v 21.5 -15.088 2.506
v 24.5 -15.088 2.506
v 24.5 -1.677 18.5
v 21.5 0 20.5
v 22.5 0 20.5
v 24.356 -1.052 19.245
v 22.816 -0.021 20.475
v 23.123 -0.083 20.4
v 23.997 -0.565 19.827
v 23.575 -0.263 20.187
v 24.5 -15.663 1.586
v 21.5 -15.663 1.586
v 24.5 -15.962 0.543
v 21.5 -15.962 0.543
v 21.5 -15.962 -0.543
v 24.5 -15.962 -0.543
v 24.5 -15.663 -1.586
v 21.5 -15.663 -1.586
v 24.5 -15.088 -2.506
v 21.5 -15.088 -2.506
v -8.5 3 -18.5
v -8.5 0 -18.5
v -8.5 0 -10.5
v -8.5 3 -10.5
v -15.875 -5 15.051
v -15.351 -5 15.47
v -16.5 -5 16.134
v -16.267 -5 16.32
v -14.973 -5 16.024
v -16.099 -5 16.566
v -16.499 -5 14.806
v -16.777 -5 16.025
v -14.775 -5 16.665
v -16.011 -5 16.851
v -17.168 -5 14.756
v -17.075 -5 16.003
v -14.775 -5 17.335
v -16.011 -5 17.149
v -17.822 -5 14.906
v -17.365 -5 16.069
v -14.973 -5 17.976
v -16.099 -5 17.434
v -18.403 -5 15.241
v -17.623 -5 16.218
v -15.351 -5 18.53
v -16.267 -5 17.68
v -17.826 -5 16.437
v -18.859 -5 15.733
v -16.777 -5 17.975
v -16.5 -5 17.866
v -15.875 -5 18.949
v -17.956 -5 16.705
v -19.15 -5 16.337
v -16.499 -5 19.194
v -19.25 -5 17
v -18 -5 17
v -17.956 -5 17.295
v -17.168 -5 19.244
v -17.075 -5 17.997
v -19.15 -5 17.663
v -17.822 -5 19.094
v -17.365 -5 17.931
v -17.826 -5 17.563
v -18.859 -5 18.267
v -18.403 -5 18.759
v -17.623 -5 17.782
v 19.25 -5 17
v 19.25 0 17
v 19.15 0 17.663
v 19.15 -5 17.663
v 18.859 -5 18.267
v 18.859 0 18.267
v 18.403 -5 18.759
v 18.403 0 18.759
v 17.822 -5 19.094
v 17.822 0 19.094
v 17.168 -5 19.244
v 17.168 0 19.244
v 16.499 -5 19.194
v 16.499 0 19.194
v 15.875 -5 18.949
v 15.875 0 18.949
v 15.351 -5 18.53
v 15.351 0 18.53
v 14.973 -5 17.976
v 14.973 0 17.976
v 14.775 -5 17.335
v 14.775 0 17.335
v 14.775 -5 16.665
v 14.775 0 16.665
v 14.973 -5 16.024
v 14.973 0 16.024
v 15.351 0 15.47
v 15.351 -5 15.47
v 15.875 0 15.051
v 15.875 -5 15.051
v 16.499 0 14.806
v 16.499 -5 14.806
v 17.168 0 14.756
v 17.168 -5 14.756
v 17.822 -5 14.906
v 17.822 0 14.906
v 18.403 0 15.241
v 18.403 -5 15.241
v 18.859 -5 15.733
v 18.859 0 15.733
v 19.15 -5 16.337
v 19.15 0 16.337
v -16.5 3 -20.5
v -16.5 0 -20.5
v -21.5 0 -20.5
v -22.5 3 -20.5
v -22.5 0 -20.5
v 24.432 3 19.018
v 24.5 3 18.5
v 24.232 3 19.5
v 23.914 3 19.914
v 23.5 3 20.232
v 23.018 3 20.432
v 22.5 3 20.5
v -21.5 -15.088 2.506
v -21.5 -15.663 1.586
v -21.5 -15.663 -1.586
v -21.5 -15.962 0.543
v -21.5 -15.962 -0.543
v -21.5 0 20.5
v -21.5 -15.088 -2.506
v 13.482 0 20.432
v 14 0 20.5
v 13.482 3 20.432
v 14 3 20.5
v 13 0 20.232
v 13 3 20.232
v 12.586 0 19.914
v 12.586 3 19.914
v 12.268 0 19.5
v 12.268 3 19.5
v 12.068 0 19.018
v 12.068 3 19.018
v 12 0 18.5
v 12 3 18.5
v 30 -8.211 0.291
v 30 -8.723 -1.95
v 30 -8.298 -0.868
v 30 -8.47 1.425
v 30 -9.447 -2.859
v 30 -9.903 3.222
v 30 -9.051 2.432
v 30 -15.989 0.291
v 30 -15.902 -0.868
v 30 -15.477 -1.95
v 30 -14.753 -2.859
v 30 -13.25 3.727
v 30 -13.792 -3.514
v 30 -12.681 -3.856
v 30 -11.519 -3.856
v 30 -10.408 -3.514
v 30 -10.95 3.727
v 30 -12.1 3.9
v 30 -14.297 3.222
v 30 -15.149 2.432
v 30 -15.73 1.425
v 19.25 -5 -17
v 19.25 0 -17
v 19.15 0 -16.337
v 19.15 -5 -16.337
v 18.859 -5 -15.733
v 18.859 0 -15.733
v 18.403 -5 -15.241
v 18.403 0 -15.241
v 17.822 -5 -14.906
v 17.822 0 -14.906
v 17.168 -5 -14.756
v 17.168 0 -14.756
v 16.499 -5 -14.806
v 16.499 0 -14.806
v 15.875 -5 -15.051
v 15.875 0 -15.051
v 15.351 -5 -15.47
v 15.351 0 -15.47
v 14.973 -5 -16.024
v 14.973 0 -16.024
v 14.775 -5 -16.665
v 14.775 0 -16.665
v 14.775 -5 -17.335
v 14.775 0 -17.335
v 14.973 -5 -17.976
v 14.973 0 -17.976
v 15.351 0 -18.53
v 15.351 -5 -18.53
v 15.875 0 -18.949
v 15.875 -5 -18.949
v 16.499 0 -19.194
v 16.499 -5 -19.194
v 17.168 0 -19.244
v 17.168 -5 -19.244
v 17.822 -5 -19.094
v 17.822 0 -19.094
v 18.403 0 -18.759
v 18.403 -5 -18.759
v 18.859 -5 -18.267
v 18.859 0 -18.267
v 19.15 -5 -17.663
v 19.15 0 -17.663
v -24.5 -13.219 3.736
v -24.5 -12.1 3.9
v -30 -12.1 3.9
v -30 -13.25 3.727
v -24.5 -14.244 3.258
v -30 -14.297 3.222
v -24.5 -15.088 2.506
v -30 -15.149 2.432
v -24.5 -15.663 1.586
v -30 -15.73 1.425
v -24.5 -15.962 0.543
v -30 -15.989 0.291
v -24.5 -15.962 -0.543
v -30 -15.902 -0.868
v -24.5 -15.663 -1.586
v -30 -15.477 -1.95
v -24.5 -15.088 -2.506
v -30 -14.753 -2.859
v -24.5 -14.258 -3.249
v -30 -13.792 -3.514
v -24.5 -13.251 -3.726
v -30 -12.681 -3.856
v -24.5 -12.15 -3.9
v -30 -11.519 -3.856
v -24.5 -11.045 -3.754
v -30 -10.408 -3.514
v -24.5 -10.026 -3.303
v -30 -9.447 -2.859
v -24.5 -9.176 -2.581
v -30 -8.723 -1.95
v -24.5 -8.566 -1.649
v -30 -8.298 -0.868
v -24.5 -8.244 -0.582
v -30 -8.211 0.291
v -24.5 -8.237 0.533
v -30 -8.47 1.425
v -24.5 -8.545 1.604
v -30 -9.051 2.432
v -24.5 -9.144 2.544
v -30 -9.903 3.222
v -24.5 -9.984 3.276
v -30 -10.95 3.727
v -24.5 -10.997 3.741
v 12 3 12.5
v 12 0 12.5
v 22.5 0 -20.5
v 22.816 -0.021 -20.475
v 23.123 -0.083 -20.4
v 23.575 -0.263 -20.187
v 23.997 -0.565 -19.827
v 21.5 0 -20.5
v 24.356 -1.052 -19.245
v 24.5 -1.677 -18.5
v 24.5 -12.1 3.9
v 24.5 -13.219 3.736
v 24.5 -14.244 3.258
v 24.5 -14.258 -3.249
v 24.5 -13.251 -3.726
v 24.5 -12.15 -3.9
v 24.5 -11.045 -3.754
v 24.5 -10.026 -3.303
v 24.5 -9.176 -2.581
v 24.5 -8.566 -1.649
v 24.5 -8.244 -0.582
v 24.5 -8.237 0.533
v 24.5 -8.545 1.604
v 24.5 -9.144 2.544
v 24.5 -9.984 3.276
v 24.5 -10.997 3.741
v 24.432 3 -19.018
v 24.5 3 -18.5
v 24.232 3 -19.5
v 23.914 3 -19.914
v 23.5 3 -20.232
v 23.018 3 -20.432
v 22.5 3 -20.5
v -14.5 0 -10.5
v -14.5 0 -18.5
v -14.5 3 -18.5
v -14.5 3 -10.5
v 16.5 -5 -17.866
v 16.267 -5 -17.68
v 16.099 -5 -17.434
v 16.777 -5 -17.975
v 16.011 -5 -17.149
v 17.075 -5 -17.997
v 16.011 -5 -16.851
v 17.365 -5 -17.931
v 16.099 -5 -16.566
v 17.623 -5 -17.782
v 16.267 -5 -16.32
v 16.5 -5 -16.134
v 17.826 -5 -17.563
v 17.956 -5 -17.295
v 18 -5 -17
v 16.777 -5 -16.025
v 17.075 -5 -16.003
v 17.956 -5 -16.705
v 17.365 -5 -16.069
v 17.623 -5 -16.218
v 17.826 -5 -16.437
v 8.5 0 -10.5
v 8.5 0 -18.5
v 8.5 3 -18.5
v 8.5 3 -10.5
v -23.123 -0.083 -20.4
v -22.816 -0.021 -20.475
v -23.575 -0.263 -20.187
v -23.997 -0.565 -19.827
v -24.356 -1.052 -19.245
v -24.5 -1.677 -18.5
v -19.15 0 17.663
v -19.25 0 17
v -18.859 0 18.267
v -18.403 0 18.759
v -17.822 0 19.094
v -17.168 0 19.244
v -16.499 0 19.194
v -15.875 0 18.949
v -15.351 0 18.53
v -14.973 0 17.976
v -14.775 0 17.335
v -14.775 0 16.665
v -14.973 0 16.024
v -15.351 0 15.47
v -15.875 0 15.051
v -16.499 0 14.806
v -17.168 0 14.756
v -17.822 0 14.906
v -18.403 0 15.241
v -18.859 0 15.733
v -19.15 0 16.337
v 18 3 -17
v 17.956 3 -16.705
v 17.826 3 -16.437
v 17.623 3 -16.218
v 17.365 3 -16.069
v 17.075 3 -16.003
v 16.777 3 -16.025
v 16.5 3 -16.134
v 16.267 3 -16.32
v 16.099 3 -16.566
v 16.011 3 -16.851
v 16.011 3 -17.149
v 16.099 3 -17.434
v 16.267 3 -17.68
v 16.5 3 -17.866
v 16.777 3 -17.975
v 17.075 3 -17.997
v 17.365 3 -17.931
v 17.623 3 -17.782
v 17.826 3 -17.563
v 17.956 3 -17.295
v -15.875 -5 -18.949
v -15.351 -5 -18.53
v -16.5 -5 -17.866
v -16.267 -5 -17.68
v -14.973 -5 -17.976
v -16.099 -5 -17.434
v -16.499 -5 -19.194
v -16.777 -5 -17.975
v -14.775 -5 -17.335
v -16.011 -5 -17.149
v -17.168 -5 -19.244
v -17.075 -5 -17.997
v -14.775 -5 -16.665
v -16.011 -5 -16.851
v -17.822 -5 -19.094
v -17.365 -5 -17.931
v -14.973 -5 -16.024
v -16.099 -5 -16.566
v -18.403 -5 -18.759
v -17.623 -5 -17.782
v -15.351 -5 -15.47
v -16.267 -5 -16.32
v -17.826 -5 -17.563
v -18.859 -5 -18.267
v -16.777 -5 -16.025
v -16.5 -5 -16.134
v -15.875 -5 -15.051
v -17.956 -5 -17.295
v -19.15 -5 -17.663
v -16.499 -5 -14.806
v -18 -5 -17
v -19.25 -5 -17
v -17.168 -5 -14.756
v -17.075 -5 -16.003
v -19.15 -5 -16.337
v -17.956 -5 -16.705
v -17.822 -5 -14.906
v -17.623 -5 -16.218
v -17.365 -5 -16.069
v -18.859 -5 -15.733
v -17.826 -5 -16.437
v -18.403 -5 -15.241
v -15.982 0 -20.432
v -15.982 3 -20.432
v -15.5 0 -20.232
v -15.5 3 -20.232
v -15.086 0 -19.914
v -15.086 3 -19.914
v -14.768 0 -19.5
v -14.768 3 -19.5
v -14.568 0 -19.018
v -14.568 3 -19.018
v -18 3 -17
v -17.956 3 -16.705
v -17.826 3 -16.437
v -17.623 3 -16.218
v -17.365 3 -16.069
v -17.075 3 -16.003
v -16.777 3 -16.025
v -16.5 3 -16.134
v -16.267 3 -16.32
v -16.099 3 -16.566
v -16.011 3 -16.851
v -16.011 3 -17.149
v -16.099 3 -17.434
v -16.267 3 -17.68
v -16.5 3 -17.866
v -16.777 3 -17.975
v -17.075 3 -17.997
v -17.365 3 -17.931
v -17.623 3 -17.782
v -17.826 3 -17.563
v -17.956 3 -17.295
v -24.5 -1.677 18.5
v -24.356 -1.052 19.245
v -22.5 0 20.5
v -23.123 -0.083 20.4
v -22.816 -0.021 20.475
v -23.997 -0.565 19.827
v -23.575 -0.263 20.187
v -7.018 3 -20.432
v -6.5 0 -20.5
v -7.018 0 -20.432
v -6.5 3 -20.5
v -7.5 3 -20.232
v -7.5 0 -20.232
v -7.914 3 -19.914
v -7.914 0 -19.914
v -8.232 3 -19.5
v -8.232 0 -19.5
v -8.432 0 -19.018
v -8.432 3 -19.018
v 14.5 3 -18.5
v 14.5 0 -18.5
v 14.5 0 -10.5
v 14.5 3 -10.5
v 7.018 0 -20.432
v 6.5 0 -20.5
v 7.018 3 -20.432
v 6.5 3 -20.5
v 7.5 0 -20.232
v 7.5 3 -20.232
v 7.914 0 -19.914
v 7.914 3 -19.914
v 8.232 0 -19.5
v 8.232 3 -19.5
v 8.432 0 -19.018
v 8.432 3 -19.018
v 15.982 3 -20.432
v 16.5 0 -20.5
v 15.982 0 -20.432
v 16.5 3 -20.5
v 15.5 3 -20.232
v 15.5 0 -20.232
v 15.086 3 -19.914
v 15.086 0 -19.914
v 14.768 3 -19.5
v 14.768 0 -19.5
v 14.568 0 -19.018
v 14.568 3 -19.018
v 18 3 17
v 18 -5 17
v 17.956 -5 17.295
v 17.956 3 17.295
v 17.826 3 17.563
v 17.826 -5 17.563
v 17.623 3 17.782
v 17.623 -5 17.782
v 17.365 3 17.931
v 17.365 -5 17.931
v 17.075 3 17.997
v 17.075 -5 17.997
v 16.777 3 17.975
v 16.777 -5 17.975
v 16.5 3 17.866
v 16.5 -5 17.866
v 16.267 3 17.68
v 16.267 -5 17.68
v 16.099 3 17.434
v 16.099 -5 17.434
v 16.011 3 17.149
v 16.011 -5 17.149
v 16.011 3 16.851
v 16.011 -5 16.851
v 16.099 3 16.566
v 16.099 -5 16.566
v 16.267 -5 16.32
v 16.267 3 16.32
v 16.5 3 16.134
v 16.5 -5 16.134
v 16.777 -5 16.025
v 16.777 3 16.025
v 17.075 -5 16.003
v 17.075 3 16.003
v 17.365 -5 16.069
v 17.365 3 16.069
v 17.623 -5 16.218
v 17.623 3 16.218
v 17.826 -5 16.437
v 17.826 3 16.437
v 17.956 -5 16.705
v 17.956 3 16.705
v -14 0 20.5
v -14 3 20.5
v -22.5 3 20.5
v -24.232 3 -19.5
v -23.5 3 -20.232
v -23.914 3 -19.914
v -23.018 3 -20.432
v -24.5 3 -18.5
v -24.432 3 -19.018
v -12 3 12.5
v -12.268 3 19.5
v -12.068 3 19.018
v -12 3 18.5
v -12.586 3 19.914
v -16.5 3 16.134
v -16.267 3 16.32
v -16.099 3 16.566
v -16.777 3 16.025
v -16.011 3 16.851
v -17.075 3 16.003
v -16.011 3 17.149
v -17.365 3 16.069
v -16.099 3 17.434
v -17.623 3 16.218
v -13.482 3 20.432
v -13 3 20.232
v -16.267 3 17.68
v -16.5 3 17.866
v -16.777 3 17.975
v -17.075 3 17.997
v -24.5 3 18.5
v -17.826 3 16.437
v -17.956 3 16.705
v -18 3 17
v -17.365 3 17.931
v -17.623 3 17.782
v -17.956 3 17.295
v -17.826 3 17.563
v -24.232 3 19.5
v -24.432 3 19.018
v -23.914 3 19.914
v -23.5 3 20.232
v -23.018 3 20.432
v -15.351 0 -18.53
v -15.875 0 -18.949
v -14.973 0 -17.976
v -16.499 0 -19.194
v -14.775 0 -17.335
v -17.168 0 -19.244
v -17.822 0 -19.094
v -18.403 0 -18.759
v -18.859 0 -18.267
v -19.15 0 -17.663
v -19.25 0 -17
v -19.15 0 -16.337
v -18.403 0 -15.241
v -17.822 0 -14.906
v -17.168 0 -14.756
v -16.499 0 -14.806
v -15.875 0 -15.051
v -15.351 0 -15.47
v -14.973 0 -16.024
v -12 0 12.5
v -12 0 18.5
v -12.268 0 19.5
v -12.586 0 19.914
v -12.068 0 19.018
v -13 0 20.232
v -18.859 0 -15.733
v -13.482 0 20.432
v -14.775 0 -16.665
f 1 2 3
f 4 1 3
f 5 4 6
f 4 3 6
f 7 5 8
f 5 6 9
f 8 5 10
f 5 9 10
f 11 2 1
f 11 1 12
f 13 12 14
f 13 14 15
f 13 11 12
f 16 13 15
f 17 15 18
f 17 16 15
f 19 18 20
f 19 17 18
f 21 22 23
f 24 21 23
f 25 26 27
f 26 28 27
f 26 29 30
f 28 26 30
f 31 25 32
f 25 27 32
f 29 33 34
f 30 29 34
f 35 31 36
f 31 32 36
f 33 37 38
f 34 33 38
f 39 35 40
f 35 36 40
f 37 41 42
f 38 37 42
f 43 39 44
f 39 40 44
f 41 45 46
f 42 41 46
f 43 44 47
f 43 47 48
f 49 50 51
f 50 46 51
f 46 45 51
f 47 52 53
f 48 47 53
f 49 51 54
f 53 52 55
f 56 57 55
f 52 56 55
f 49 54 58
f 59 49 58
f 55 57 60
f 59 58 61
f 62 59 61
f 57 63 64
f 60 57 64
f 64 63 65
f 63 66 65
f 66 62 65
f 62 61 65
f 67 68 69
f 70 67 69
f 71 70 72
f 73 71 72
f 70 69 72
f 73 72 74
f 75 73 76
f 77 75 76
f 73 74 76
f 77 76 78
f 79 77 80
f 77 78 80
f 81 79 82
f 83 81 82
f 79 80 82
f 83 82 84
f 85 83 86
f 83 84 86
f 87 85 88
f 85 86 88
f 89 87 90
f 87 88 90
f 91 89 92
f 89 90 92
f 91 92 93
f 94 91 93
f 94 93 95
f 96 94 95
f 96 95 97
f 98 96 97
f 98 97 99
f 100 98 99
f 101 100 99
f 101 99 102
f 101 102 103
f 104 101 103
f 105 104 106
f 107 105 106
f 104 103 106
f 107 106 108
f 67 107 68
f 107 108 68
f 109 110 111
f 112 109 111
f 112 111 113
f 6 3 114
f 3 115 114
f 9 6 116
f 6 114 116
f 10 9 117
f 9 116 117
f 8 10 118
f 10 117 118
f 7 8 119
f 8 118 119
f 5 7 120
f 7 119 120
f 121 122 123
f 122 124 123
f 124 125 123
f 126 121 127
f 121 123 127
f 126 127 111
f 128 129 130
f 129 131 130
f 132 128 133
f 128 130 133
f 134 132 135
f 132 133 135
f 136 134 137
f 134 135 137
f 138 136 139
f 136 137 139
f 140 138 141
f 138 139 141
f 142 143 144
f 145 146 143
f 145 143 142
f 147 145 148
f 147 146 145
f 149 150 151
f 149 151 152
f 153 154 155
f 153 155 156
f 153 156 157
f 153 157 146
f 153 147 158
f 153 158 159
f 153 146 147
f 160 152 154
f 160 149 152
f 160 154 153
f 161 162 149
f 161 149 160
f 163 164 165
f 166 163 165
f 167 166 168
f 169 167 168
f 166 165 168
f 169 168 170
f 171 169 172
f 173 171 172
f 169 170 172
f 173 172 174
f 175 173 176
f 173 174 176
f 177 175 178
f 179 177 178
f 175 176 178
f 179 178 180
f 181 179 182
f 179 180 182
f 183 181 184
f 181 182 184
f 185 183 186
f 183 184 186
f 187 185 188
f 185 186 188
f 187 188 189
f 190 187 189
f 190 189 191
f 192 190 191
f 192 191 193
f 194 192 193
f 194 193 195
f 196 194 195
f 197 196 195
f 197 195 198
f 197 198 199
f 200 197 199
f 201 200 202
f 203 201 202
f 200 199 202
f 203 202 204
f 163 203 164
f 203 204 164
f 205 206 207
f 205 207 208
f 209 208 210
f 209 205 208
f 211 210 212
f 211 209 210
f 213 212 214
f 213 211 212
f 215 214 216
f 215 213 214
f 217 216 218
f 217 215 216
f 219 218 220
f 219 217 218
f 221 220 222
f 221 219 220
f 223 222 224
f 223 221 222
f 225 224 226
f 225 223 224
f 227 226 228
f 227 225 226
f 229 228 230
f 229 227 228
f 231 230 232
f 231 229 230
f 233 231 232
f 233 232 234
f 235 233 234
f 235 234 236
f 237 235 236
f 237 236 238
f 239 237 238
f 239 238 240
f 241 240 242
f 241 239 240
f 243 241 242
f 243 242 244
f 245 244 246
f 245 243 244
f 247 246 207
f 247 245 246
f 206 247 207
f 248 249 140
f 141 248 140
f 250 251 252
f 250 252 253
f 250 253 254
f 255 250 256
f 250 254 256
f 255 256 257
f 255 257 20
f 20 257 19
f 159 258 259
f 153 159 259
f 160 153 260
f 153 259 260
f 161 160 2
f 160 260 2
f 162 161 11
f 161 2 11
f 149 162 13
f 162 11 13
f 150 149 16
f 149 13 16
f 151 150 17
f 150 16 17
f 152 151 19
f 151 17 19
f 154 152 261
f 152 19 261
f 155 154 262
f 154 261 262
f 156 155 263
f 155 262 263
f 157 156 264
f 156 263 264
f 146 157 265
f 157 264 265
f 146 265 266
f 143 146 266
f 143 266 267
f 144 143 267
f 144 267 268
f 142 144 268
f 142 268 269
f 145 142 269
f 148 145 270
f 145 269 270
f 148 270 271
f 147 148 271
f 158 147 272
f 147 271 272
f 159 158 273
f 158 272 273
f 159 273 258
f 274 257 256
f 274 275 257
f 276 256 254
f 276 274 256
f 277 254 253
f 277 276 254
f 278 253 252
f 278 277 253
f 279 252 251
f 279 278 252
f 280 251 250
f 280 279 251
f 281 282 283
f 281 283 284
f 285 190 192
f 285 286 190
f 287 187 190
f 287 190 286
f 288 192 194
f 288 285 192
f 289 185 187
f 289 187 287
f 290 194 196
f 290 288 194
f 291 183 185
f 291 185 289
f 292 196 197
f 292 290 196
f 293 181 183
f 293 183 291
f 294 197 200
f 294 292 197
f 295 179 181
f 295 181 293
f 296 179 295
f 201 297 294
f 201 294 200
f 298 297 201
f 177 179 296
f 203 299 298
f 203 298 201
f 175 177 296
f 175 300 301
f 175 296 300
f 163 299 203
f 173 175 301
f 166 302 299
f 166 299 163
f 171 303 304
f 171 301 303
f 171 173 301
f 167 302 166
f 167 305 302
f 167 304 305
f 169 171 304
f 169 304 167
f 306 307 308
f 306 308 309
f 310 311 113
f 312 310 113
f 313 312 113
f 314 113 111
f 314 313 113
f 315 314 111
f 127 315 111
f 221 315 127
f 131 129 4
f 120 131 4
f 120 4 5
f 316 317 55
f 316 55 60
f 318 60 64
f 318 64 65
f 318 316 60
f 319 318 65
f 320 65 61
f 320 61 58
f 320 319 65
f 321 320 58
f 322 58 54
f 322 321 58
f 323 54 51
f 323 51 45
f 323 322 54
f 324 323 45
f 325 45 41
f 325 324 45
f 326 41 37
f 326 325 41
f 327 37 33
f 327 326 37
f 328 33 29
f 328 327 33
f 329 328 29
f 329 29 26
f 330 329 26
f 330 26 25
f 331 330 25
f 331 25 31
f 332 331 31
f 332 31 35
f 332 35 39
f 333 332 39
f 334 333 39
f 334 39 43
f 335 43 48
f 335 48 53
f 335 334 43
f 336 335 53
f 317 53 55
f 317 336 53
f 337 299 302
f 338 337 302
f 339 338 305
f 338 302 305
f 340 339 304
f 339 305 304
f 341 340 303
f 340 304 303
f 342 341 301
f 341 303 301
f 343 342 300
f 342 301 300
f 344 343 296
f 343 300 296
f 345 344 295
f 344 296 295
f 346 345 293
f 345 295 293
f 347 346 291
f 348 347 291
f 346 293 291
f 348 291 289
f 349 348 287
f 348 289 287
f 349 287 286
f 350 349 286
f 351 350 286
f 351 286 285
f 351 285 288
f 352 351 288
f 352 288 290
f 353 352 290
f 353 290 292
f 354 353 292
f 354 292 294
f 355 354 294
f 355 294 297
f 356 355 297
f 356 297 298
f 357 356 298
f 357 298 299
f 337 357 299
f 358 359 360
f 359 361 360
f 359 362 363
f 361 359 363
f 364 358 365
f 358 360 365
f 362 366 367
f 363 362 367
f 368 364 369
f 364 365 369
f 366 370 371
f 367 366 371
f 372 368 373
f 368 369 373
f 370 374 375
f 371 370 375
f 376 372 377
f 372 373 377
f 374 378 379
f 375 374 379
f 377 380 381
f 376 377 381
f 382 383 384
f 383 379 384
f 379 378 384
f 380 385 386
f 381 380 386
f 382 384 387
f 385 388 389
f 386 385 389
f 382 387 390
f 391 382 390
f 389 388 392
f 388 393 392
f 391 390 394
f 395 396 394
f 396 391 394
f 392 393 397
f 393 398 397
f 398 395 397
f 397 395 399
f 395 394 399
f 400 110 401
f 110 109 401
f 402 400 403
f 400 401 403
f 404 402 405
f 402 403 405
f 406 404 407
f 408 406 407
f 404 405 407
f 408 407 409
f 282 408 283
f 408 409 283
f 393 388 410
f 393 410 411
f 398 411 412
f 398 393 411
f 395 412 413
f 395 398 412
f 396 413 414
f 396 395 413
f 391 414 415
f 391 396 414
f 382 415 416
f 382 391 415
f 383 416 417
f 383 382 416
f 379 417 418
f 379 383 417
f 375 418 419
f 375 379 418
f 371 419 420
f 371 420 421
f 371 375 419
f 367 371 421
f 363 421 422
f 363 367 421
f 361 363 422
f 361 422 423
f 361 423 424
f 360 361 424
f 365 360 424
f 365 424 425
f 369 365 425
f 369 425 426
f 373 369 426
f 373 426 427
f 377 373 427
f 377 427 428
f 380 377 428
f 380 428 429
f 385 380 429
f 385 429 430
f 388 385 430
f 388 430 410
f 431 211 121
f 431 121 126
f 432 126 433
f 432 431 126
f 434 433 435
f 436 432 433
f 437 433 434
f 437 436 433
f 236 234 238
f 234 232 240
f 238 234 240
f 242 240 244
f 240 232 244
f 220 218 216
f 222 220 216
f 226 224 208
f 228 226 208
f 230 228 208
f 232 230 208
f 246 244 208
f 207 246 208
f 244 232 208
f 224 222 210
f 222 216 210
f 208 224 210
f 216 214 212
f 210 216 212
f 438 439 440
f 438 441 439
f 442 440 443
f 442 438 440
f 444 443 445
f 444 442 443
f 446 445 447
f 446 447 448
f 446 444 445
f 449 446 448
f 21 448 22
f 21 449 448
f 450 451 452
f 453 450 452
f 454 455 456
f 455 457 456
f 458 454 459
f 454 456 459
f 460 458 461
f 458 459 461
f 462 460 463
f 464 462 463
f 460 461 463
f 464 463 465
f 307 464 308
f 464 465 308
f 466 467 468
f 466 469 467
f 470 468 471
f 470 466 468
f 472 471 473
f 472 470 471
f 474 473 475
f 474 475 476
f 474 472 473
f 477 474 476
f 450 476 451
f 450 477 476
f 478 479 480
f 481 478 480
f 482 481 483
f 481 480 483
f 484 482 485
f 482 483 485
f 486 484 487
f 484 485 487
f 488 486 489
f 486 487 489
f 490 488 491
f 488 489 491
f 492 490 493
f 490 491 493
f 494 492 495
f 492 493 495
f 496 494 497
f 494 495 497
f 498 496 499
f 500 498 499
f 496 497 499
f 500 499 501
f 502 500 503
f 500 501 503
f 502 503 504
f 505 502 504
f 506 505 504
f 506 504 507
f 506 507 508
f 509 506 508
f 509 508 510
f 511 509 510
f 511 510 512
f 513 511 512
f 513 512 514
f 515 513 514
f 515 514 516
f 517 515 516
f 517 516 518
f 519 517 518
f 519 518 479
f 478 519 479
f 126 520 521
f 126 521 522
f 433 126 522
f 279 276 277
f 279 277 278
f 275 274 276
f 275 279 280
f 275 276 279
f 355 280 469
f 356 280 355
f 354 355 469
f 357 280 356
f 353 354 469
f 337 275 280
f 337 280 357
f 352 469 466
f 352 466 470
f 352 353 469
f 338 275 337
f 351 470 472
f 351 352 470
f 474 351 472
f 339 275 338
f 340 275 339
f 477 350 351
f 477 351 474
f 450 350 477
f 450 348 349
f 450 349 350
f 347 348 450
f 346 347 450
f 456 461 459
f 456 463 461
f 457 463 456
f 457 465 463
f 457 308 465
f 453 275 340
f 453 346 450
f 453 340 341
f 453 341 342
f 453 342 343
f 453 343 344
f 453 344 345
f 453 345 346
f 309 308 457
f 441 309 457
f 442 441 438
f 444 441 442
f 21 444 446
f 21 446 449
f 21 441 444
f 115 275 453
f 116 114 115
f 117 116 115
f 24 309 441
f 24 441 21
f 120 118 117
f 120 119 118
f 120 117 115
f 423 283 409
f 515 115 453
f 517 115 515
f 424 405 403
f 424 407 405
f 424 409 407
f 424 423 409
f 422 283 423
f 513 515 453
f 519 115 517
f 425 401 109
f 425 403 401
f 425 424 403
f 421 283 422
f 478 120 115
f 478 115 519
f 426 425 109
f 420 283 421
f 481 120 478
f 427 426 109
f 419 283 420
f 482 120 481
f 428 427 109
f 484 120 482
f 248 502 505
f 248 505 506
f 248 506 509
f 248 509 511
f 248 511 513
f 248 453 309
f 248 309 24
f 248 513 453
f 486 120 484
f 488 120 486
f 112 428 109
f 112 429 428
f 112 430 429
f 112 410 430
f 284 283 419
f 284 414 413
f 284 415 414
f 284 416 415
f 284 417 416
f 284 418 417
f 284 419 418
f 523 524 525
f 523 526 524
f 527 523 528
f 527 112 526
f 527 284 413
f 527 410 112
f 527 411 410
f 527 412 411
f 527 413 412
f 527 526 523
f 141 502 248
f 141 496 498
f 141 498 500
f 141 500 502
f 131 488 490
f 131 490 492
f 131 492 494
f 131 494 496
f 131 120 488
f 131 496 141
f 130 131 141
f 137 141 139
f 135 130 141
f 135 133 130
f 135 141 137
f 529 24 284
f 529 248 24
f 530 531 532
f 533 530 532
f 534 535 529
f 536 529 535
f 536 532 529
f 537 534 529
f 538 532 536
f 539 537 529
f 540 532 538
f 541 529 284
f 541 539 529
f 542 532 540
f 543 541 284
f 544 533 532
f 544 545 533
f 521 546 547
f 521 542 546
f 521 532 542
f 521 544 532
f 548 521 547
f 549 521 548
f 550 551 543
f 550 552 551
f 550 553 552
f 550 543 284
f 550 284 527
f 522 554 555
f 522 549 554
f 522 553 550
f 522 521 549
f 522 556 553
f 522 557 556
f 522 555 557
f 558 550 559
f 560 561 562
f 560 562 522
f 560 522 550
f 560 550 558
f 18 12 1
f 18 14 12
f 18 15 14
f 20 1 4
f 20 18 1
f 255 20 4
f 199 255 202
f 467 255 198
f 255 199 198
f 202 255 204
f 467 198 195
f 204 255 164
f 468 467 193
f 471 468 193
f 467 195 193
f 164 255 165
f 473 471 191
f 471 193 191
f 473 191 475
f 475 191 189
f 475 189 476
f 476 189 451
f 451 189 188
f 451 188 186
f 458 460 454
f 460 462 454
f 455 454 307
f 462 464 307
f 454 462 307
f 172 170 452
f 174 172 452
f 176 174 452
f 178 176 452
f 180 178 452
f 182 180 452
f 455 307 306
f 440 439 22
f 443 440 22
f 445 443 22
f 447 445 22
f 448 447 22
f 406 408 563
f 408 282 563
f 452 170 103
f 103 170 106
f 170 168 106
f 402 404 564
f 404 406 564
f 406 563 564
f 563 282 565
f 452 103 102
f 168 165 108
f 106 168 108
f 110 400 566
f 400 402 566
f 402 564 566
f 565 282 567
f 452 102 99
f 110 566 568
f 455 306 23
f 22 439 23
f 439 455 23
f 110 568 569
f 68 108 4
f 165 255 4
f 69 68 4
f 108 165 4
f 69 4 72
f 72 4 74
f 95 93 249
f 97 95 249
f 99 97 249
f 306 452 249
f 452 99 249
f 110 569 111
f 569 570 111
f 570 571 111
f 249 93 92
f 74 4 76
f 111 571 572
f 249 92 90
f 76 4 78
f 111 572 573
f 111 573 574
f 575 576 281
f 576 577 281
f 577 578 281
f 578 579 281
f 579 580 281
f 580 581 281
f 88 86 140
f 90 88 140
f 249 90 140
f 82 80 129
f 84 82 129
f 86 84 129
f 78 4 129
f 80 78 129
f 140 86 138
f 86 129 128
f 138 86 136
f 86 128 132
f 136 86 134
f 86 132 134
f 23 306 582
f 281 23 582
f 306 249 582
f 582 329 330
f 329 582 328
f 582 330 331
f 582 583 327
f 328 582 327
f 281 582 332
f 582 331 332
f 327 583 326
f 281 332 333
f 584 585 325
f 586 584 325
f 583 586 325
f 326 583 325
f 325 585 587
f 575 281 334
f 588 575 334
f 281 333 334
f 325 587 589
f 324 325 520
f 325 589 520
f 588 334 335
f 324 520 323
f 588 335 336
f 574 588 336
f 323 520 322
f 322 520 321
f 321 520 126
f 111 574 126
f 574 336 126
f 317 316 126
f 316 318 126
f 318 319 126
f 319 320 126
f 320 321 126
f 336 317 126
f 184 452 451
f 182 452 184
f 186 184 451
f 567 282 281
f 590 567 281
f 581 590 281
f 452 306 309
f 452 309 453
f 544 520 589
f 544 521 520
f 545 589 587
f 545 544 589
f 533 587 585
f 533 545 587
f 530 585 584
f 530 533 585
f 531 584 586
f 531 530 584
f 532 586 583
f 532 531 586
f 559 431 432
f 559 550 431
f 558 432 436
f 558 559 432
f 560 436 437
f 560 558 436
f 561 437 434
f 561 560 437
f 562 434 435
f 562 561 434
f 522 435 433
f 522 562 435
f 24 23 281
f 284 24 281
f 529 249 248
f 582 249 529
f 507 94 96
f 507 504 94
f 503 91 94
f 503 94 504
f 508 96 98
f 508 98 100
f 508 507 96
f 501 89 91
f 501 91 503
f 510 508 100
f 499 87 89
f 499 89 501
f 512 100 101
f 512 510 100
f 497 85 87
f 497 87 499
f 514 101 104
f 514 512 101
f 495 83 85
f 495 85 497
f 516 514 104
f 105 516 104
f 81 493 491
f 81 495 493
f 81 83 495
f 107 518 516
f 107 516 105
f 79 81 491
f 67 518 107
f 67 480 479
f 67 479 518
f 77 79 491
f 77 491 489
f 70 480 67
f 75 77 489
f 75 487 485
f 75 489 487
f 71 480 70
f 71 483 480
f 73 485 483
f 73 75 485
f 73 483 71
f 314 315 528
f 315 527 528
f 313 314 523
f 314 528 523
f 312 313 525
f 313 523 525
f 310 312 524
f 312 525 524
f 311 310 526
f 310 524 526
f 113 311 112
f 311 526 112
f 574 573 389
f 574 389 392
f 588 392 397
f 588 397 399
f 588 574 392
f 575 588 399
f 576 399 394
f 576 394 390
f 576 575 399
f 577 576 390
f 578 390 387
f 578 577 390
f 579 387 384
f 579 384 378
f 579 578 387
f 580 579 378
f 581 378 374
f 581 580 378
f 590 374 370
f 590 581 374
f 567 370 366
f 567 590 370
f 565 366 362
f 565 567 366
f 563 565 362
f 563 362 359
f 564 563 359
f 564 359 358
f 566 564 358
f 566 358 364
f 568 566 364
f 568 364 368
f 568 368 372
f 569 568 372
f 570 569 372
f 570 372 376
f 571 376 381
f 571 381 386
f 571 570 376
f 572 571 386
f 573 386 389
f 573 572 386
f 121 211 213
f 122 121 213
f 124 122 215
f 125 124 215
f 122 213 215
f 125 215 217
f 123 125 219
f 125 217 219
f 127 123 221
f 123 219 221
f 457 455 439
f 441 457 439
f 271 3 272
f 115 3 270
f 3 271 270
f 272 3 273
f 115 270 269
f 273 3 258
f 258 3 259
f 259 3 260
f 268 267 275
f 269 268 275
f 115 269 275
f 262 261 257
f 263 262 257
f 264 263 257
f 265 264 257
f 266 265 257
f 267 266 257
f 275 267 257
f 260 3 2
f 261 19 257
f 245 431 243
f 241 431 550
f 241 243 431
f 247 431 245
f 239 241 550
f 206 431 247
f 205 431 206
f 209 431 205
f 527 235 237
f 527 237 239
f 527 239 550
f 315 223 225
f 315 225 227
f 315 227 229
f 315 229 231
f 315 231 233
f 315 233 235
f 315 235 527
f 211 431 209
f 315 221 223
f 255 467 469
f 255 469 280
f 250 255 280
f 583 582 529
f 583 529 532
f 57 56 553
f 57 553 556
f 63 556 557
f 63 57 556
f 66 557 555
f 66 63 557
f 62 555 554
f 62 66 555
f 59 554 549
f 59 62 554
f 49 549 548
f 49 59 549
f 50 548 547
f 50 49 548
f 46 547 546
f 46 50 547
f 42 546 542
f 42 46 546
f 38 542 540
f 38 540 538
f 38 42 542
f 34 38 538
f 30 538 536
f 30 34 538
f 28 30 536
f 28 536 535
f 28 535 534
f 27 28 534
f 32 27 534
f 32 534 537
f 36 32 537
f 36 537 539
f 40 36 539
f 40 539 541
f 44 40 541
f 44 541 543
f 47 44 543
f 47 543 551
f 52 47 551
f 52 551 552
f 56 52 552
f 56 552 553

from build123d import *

# Parameters (mm, degrees)
SKETCH_W        = 24.5
SKETCH_H        = 41
PAD_DEPTH       = 3
SKETCH001_R     = 2.25
PAD001_DEPTH    = 5
PAD002_DEPTH    = 3
SKETCH003_R     = 3.9
PAD003_DEPTH    = 5.5
SKETCH004_W     = 12
SKETCH004_H     = 8
POCKET_DEPTH    = 3.001
SKETCH005_W     = 6
SKETCH005_H     = 10
POCKET001_DEPTH = 3.001
SKETCH006_R     = 1
POCKET002_DEPTH = 8.001
FILLET_R        = 2


with BuildPart() as part:
    # Sketch → Pad (new body)
    with BuildSketch(Plane.XZ):
        with Locations((12.25, 0)):
            Rectangle(SKETCH_W, SKETCH_H)
    extrude(amount=-PAD_DEPTH)

    # Sketch001 → Pad001 (join)
    with BuildSketch(Plane.XZ):
        with Locations((17, 17)):
            Circle(SKETCH001_R)
        with Locations((17, -17)):
            Circle(SKETCH001_R)
    extrude(amount=PAD001_DEPTH)

    # Sketch002 (on Face6 of Pad001) → Pad002 (join)
    with BuildSketch(Plane(origin=(24.5, 0, 0), x_dir=(0, 0, 1), z_dir=(1, 0, 0))):
        with BuildLine():
            Line((20.5, 0), (-20.5, 0))
            Line((-20.5, 0), (-2.505853, 15.088428))
            ThreePointArc((2.505853, 15.088428), (0, 16), (-2.505853, 15.088428))
            Line((2.505853, 15.088428), (20.5, 0))
        make_face()
    extrude(amount=-PAD002_DEPTH)

    # Sketch003 (on Face14 of Pad002) → Pad003 (join)
    with BuildSketch(Plane(origin=(24.5, 0, 0), x_dir=(0, 0, 1), z_dir=(1, 0, 0))):
        with Locations((0, 12.1)):
            Circle(SKETCH003_R)
    extrude(amount=PAD003_DEPTH)

    # Sketch004 → Pocket (cut, through all)
    with BuildSketch(Plane.XZ):
        with Locations((6, 16.5)):
            Rectangle(SKETCH004_W, SKETCH004_H)
    extrude(amount=-POCKET_DEPTH, mode=Mode.SUBTRACT)

    # Sketch005 (on Face4 of Pocket) → Pocket001 (cut, through all)
    with BuildSketch(Plane.XZ):
        with Locations((11.5, -15.5)):
            Rectangle(SKETCH005_W, SKETCH005_H)
    extrude(amount=-POCKET001_DEPTH, mode=Mode.SUBTRACT)

    # Sketch006 (on Face20 of Pocket001) → Pocket002 (cut, through all)
    with BuildSketch(Plane.XZ.offset(5)):
        with Locations((17, 17)):
            Circle(SKETCH006_R)
        with Locations((17, -17)):
            Circle(SKETCH006_R)
    extrude(amount=-POCKET002_DEPTH, mode=Mode.SUBTRACT)

    # Fillet
    fillet_edges = [part.edges().sort_by_distance(p)[0] for p in [
        (8.5, 1.5, -20.5),
        (12, 1.5, 20.5),
        (24.5, 1.5, 20.5),
        (24.5, 1.5, -20.5),
        (14.5, 1.5, -20.5),
    ]]
    fillet(fillet_edges, radius=FILLET_R)

    # Mirrored: part across YZ


with BuildPart() as part_1:
    add(part.part)
    add(part.part.mirror(Plane.YZ))


solid = part_1.part
